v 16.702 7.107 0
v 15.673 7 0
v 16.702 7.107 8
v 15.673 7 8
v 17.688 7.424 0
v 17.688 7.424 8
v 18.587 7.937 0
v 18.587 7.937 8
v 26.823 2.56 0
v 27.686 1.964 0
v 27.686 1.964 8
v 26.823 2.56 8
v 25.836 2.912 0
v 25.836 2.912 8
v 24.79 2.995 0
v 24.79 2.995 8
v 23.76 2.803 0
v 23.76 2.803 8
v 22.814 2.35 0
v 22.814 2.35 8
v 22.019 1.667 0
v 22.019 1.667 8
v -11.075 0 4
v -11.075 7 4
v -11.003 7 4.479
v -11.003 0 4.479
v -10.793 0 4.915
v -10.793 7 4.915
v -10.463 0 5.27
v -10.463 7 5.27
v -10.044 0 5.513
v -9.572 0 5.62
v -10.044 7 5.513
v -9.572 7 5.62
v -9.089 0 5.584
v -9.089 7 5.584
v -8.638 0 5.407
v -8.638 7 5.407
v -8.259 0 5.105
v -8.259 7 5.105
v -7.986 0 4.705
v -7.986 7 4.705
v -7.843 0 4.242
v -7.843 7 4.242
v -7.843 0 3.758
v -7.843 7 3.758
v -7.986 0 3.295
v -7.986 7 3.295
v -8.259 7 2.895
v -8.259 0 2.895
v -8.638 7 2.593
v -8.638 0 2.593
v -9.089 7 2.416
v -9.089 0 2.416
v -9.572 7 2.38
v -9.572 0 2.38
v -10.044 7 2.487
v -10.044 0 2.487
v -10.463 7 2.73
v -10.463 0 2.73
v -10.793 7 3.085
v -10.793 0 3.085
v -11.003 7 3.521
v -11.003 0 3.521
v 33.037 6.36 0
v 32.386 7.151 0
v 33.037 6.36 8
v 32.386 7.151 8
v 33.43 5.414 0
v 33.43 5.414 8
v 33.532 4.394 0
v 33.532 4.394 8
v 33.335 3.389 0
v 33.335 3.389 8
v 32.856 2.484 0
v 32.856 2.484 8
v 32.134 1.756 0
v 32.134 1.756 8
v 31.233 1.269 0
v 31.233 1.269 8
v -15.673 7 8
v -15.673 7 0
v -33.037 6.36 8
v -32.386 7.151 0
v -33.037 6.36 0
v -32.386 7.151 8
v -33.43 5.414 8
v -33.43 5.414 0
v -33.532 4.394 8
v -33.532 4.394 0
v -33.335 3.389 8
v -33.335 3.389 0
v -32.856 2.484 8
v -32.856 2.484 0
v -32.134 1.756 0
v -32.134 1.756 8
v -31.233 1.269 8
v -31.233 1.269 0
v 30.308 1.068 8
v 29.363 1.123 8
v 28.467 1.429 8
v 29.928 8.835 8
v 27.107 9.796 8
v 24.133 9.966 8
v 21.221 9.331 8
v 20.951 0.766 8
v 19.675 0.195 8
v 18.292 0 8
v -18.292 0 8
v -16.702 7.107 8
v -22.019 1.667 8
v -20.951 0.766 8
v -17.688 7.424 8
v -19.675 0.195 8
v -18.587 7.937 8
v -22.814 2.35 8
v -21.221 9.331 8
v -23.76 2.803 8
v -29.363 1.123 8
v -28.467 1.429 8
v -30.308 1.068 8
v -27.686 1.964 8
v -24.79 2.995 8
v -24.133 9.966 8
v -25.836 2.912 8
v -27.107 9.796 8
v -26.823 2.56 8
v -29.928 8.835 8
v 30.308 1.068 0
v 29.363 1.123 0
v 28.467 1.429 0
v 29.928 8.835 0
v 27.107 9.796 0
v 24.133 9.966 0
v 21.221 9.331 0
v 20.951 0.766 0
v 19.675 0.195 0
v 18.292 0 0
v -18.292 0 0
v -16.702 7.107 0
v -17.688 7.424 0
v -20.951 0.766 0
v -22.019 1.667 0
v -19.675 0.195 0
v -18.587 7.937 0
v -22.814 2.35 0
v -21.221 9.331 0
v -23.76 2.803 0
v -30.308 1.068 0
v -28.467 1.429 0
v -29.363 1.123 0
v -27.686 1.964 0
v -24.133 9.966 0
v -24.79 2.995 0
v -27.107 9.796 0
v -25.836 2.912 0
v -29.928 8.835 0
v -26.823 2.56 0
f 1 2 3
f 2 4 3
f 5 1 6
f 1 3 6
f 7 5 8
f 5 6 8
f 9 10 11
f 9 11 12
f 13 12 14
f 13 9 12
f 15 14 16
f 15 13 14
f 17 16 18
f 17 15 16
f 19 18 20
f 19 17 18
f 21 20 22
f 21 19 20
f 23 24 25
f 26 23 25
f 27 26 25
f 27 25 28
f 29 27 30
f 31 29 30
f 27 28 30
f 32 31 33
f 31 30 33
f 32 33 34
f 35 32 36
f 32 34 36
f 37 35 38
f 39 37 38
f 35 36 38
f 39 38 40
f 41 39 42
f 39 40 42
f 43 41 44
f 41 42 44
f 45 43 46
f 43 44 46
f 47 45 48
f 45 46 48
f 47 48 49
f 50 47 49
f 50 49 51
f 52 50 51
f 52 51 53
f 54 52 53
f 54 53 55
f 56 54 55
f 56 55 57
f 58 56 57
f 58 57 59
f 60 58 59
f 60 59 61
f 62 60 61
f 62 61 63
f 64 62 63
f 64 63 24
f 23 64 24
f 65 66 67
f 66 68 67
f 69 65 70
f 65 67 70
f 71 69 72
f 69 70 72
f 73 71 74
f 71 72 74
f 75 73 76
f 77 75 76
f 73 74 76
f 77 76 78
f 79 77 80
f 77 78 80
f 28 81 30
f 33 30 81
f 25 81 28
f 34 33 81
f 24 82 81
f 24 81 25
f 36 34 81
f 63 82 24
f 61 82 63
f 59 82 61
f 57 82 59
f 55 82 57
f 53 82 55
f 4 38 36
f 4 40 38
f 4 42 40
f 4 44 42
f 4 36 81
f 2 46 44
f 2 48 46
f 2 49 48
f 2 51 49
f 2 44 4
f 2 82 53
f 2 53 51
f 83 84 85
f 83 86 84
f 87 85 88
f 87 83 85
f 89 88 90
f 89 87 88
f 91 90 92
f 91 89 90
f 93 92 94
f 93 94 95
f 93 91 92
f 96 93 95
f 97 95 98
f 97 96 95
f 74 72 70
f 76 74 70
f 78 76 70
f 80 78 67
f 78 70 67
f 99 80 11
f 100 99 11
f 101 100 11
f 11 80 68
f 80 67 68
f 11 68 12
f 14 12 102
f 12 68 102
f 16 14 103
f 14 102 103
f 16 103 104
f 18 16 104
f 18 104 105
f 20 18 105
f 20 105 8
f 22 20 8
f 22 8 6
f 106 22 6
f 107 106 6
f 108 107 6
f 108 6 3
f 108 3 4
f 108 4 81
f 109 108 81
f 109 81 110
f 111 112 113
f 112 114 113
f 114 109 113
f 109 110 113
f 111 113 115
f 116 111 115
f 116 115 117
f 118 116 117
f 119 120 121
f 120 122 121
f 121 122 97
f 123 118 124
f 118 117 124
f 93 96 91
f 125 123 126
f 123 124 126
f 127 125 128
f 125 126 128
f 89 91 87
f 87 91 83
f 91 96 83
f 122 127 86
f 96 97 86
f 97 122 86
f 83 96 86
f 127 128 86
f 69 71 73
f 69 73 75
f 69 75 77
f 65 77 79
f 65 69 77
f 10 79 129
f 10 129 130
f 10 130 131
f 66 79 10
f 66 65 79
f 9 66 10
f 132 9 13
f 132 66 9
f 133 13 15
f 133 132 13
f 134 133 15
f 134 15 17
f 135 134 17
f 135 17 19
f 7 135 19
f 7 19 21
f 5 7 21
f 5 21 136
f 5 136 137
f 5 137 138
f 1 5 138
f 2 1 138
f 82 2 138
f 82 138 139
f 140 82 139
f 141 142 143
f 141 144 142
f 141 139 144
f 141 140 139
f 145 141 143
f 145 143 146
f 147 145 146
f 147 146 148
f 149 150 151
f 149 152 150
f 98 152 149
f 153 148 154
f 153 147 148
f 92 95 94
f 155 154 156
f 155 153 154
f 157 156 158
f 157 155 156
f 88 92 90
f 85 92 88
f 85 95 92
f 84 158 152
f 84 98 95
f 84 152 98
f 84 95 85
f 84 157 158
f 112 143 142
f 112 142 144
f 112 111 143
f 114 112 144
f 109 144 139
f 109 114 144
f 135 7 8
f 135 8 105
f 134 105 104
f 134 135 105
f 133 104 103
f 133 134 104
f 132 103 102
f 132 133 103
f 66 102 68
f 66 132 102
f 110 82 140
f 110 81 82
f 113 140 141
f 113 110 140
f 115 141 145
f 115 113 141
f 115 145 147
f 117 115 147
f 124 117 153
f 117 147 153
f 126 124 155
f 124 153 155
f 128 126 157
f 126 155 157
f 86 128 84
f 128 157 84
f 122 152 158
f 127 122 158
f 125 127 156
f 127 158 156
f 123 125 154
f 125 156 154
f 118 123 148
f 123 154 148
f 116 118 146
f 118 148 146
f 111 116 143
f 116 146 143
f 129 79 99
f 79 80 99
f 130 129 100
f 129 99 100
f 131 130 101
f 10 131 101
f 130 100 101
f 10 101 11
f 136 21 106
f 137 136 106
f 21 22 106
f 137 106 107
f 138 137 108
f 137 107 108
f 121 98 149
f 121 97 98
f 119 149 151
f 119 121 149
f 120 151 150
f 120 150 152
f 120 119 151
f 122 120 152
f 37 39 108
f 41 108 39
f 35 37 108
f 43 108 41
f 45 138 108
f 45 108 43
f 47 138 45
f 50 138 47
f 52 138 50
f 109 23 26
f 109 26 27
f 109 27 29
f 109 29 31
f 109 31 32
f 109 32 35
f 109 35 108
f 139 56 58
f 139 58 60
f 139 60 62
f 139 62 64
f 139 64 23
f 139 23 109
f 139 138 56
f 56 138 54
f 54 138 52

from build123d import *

# Parameters (mm, degrees)
F2_DEPTH = 8
F4_R     = 5
F5_R     = 3.49999
F3_R     = 1.625
F8_DEPTH = 7.001


# Not quite as in the source:
# - a fillet or chamfer is up to 0.001 mm smaller than in the source, because OpenCascade refuses the exact size


with BuildPart() as f2:
    # F1 (on Top) → F2 (new body)
    with BuildSketch(Plane.XY):
        with BuildLine():
            Line((0, 7), (-17.4501655647, 7))
            ThreePointArc((-17.4501655647, 7), (-27.535987639, 9.7036800538), (-35.3366188286, 2.7622215766))
            Line((-35.3366188286, 2.7622215766), (-28.7587704831, 0.3680805733))
            ThreePointArc((-28.7587704831, 0.3680805733), (-24.8073034208, 2.9953558075), (-21.1270166538, 0))
            Line((-21.1270166538, 0), (0, 0))
            Line((0, 0), (0, 7))
        make_face()
    extrude(amount=F2_DEPTH)

    # F4
    f4_edges = [f2.edges().sort_by_distance(p)[0] for p in [
        (-17.450166, 7, 4),
        (-21.127017, 0, 4),
    ]]
    fillet(f4_edges, radius=F4_R)

    # F5 (radius 3.5 in the source; OpenCascade refuses exactly that, so slightly less here)
    f5_edges = [f2.edges().sort_by_distance(p)[0] for p in [
        (-35.336619, 2.762222, 4),
        (-28.75877, 0.368081, 4),
    ]]
    fillet(f5_edges, radius=F5_R)

    # F7: F2 across face


with BuildPart() as f2_1:
    add(f2.part)
    add(f2.part.mirror(Plane(origin=(0, 3.5, 4), x_dir=(0, 1, 0), z_dir=(1, 0, 0))))

    # F3 (on face) → F8 (cut, through all)
    with BuildSketch(Plane(origin=(0, 7, 0), x_dir=(-1, 0, 0), z_dir=(0, 1, 0))):
        with Locations((9.4501655647, 4)):
            Circle(F3_R)
    extrude(amount=-F8_DEPTH, mode=Mode.SUBTRACT)


solid = f2_1.part
